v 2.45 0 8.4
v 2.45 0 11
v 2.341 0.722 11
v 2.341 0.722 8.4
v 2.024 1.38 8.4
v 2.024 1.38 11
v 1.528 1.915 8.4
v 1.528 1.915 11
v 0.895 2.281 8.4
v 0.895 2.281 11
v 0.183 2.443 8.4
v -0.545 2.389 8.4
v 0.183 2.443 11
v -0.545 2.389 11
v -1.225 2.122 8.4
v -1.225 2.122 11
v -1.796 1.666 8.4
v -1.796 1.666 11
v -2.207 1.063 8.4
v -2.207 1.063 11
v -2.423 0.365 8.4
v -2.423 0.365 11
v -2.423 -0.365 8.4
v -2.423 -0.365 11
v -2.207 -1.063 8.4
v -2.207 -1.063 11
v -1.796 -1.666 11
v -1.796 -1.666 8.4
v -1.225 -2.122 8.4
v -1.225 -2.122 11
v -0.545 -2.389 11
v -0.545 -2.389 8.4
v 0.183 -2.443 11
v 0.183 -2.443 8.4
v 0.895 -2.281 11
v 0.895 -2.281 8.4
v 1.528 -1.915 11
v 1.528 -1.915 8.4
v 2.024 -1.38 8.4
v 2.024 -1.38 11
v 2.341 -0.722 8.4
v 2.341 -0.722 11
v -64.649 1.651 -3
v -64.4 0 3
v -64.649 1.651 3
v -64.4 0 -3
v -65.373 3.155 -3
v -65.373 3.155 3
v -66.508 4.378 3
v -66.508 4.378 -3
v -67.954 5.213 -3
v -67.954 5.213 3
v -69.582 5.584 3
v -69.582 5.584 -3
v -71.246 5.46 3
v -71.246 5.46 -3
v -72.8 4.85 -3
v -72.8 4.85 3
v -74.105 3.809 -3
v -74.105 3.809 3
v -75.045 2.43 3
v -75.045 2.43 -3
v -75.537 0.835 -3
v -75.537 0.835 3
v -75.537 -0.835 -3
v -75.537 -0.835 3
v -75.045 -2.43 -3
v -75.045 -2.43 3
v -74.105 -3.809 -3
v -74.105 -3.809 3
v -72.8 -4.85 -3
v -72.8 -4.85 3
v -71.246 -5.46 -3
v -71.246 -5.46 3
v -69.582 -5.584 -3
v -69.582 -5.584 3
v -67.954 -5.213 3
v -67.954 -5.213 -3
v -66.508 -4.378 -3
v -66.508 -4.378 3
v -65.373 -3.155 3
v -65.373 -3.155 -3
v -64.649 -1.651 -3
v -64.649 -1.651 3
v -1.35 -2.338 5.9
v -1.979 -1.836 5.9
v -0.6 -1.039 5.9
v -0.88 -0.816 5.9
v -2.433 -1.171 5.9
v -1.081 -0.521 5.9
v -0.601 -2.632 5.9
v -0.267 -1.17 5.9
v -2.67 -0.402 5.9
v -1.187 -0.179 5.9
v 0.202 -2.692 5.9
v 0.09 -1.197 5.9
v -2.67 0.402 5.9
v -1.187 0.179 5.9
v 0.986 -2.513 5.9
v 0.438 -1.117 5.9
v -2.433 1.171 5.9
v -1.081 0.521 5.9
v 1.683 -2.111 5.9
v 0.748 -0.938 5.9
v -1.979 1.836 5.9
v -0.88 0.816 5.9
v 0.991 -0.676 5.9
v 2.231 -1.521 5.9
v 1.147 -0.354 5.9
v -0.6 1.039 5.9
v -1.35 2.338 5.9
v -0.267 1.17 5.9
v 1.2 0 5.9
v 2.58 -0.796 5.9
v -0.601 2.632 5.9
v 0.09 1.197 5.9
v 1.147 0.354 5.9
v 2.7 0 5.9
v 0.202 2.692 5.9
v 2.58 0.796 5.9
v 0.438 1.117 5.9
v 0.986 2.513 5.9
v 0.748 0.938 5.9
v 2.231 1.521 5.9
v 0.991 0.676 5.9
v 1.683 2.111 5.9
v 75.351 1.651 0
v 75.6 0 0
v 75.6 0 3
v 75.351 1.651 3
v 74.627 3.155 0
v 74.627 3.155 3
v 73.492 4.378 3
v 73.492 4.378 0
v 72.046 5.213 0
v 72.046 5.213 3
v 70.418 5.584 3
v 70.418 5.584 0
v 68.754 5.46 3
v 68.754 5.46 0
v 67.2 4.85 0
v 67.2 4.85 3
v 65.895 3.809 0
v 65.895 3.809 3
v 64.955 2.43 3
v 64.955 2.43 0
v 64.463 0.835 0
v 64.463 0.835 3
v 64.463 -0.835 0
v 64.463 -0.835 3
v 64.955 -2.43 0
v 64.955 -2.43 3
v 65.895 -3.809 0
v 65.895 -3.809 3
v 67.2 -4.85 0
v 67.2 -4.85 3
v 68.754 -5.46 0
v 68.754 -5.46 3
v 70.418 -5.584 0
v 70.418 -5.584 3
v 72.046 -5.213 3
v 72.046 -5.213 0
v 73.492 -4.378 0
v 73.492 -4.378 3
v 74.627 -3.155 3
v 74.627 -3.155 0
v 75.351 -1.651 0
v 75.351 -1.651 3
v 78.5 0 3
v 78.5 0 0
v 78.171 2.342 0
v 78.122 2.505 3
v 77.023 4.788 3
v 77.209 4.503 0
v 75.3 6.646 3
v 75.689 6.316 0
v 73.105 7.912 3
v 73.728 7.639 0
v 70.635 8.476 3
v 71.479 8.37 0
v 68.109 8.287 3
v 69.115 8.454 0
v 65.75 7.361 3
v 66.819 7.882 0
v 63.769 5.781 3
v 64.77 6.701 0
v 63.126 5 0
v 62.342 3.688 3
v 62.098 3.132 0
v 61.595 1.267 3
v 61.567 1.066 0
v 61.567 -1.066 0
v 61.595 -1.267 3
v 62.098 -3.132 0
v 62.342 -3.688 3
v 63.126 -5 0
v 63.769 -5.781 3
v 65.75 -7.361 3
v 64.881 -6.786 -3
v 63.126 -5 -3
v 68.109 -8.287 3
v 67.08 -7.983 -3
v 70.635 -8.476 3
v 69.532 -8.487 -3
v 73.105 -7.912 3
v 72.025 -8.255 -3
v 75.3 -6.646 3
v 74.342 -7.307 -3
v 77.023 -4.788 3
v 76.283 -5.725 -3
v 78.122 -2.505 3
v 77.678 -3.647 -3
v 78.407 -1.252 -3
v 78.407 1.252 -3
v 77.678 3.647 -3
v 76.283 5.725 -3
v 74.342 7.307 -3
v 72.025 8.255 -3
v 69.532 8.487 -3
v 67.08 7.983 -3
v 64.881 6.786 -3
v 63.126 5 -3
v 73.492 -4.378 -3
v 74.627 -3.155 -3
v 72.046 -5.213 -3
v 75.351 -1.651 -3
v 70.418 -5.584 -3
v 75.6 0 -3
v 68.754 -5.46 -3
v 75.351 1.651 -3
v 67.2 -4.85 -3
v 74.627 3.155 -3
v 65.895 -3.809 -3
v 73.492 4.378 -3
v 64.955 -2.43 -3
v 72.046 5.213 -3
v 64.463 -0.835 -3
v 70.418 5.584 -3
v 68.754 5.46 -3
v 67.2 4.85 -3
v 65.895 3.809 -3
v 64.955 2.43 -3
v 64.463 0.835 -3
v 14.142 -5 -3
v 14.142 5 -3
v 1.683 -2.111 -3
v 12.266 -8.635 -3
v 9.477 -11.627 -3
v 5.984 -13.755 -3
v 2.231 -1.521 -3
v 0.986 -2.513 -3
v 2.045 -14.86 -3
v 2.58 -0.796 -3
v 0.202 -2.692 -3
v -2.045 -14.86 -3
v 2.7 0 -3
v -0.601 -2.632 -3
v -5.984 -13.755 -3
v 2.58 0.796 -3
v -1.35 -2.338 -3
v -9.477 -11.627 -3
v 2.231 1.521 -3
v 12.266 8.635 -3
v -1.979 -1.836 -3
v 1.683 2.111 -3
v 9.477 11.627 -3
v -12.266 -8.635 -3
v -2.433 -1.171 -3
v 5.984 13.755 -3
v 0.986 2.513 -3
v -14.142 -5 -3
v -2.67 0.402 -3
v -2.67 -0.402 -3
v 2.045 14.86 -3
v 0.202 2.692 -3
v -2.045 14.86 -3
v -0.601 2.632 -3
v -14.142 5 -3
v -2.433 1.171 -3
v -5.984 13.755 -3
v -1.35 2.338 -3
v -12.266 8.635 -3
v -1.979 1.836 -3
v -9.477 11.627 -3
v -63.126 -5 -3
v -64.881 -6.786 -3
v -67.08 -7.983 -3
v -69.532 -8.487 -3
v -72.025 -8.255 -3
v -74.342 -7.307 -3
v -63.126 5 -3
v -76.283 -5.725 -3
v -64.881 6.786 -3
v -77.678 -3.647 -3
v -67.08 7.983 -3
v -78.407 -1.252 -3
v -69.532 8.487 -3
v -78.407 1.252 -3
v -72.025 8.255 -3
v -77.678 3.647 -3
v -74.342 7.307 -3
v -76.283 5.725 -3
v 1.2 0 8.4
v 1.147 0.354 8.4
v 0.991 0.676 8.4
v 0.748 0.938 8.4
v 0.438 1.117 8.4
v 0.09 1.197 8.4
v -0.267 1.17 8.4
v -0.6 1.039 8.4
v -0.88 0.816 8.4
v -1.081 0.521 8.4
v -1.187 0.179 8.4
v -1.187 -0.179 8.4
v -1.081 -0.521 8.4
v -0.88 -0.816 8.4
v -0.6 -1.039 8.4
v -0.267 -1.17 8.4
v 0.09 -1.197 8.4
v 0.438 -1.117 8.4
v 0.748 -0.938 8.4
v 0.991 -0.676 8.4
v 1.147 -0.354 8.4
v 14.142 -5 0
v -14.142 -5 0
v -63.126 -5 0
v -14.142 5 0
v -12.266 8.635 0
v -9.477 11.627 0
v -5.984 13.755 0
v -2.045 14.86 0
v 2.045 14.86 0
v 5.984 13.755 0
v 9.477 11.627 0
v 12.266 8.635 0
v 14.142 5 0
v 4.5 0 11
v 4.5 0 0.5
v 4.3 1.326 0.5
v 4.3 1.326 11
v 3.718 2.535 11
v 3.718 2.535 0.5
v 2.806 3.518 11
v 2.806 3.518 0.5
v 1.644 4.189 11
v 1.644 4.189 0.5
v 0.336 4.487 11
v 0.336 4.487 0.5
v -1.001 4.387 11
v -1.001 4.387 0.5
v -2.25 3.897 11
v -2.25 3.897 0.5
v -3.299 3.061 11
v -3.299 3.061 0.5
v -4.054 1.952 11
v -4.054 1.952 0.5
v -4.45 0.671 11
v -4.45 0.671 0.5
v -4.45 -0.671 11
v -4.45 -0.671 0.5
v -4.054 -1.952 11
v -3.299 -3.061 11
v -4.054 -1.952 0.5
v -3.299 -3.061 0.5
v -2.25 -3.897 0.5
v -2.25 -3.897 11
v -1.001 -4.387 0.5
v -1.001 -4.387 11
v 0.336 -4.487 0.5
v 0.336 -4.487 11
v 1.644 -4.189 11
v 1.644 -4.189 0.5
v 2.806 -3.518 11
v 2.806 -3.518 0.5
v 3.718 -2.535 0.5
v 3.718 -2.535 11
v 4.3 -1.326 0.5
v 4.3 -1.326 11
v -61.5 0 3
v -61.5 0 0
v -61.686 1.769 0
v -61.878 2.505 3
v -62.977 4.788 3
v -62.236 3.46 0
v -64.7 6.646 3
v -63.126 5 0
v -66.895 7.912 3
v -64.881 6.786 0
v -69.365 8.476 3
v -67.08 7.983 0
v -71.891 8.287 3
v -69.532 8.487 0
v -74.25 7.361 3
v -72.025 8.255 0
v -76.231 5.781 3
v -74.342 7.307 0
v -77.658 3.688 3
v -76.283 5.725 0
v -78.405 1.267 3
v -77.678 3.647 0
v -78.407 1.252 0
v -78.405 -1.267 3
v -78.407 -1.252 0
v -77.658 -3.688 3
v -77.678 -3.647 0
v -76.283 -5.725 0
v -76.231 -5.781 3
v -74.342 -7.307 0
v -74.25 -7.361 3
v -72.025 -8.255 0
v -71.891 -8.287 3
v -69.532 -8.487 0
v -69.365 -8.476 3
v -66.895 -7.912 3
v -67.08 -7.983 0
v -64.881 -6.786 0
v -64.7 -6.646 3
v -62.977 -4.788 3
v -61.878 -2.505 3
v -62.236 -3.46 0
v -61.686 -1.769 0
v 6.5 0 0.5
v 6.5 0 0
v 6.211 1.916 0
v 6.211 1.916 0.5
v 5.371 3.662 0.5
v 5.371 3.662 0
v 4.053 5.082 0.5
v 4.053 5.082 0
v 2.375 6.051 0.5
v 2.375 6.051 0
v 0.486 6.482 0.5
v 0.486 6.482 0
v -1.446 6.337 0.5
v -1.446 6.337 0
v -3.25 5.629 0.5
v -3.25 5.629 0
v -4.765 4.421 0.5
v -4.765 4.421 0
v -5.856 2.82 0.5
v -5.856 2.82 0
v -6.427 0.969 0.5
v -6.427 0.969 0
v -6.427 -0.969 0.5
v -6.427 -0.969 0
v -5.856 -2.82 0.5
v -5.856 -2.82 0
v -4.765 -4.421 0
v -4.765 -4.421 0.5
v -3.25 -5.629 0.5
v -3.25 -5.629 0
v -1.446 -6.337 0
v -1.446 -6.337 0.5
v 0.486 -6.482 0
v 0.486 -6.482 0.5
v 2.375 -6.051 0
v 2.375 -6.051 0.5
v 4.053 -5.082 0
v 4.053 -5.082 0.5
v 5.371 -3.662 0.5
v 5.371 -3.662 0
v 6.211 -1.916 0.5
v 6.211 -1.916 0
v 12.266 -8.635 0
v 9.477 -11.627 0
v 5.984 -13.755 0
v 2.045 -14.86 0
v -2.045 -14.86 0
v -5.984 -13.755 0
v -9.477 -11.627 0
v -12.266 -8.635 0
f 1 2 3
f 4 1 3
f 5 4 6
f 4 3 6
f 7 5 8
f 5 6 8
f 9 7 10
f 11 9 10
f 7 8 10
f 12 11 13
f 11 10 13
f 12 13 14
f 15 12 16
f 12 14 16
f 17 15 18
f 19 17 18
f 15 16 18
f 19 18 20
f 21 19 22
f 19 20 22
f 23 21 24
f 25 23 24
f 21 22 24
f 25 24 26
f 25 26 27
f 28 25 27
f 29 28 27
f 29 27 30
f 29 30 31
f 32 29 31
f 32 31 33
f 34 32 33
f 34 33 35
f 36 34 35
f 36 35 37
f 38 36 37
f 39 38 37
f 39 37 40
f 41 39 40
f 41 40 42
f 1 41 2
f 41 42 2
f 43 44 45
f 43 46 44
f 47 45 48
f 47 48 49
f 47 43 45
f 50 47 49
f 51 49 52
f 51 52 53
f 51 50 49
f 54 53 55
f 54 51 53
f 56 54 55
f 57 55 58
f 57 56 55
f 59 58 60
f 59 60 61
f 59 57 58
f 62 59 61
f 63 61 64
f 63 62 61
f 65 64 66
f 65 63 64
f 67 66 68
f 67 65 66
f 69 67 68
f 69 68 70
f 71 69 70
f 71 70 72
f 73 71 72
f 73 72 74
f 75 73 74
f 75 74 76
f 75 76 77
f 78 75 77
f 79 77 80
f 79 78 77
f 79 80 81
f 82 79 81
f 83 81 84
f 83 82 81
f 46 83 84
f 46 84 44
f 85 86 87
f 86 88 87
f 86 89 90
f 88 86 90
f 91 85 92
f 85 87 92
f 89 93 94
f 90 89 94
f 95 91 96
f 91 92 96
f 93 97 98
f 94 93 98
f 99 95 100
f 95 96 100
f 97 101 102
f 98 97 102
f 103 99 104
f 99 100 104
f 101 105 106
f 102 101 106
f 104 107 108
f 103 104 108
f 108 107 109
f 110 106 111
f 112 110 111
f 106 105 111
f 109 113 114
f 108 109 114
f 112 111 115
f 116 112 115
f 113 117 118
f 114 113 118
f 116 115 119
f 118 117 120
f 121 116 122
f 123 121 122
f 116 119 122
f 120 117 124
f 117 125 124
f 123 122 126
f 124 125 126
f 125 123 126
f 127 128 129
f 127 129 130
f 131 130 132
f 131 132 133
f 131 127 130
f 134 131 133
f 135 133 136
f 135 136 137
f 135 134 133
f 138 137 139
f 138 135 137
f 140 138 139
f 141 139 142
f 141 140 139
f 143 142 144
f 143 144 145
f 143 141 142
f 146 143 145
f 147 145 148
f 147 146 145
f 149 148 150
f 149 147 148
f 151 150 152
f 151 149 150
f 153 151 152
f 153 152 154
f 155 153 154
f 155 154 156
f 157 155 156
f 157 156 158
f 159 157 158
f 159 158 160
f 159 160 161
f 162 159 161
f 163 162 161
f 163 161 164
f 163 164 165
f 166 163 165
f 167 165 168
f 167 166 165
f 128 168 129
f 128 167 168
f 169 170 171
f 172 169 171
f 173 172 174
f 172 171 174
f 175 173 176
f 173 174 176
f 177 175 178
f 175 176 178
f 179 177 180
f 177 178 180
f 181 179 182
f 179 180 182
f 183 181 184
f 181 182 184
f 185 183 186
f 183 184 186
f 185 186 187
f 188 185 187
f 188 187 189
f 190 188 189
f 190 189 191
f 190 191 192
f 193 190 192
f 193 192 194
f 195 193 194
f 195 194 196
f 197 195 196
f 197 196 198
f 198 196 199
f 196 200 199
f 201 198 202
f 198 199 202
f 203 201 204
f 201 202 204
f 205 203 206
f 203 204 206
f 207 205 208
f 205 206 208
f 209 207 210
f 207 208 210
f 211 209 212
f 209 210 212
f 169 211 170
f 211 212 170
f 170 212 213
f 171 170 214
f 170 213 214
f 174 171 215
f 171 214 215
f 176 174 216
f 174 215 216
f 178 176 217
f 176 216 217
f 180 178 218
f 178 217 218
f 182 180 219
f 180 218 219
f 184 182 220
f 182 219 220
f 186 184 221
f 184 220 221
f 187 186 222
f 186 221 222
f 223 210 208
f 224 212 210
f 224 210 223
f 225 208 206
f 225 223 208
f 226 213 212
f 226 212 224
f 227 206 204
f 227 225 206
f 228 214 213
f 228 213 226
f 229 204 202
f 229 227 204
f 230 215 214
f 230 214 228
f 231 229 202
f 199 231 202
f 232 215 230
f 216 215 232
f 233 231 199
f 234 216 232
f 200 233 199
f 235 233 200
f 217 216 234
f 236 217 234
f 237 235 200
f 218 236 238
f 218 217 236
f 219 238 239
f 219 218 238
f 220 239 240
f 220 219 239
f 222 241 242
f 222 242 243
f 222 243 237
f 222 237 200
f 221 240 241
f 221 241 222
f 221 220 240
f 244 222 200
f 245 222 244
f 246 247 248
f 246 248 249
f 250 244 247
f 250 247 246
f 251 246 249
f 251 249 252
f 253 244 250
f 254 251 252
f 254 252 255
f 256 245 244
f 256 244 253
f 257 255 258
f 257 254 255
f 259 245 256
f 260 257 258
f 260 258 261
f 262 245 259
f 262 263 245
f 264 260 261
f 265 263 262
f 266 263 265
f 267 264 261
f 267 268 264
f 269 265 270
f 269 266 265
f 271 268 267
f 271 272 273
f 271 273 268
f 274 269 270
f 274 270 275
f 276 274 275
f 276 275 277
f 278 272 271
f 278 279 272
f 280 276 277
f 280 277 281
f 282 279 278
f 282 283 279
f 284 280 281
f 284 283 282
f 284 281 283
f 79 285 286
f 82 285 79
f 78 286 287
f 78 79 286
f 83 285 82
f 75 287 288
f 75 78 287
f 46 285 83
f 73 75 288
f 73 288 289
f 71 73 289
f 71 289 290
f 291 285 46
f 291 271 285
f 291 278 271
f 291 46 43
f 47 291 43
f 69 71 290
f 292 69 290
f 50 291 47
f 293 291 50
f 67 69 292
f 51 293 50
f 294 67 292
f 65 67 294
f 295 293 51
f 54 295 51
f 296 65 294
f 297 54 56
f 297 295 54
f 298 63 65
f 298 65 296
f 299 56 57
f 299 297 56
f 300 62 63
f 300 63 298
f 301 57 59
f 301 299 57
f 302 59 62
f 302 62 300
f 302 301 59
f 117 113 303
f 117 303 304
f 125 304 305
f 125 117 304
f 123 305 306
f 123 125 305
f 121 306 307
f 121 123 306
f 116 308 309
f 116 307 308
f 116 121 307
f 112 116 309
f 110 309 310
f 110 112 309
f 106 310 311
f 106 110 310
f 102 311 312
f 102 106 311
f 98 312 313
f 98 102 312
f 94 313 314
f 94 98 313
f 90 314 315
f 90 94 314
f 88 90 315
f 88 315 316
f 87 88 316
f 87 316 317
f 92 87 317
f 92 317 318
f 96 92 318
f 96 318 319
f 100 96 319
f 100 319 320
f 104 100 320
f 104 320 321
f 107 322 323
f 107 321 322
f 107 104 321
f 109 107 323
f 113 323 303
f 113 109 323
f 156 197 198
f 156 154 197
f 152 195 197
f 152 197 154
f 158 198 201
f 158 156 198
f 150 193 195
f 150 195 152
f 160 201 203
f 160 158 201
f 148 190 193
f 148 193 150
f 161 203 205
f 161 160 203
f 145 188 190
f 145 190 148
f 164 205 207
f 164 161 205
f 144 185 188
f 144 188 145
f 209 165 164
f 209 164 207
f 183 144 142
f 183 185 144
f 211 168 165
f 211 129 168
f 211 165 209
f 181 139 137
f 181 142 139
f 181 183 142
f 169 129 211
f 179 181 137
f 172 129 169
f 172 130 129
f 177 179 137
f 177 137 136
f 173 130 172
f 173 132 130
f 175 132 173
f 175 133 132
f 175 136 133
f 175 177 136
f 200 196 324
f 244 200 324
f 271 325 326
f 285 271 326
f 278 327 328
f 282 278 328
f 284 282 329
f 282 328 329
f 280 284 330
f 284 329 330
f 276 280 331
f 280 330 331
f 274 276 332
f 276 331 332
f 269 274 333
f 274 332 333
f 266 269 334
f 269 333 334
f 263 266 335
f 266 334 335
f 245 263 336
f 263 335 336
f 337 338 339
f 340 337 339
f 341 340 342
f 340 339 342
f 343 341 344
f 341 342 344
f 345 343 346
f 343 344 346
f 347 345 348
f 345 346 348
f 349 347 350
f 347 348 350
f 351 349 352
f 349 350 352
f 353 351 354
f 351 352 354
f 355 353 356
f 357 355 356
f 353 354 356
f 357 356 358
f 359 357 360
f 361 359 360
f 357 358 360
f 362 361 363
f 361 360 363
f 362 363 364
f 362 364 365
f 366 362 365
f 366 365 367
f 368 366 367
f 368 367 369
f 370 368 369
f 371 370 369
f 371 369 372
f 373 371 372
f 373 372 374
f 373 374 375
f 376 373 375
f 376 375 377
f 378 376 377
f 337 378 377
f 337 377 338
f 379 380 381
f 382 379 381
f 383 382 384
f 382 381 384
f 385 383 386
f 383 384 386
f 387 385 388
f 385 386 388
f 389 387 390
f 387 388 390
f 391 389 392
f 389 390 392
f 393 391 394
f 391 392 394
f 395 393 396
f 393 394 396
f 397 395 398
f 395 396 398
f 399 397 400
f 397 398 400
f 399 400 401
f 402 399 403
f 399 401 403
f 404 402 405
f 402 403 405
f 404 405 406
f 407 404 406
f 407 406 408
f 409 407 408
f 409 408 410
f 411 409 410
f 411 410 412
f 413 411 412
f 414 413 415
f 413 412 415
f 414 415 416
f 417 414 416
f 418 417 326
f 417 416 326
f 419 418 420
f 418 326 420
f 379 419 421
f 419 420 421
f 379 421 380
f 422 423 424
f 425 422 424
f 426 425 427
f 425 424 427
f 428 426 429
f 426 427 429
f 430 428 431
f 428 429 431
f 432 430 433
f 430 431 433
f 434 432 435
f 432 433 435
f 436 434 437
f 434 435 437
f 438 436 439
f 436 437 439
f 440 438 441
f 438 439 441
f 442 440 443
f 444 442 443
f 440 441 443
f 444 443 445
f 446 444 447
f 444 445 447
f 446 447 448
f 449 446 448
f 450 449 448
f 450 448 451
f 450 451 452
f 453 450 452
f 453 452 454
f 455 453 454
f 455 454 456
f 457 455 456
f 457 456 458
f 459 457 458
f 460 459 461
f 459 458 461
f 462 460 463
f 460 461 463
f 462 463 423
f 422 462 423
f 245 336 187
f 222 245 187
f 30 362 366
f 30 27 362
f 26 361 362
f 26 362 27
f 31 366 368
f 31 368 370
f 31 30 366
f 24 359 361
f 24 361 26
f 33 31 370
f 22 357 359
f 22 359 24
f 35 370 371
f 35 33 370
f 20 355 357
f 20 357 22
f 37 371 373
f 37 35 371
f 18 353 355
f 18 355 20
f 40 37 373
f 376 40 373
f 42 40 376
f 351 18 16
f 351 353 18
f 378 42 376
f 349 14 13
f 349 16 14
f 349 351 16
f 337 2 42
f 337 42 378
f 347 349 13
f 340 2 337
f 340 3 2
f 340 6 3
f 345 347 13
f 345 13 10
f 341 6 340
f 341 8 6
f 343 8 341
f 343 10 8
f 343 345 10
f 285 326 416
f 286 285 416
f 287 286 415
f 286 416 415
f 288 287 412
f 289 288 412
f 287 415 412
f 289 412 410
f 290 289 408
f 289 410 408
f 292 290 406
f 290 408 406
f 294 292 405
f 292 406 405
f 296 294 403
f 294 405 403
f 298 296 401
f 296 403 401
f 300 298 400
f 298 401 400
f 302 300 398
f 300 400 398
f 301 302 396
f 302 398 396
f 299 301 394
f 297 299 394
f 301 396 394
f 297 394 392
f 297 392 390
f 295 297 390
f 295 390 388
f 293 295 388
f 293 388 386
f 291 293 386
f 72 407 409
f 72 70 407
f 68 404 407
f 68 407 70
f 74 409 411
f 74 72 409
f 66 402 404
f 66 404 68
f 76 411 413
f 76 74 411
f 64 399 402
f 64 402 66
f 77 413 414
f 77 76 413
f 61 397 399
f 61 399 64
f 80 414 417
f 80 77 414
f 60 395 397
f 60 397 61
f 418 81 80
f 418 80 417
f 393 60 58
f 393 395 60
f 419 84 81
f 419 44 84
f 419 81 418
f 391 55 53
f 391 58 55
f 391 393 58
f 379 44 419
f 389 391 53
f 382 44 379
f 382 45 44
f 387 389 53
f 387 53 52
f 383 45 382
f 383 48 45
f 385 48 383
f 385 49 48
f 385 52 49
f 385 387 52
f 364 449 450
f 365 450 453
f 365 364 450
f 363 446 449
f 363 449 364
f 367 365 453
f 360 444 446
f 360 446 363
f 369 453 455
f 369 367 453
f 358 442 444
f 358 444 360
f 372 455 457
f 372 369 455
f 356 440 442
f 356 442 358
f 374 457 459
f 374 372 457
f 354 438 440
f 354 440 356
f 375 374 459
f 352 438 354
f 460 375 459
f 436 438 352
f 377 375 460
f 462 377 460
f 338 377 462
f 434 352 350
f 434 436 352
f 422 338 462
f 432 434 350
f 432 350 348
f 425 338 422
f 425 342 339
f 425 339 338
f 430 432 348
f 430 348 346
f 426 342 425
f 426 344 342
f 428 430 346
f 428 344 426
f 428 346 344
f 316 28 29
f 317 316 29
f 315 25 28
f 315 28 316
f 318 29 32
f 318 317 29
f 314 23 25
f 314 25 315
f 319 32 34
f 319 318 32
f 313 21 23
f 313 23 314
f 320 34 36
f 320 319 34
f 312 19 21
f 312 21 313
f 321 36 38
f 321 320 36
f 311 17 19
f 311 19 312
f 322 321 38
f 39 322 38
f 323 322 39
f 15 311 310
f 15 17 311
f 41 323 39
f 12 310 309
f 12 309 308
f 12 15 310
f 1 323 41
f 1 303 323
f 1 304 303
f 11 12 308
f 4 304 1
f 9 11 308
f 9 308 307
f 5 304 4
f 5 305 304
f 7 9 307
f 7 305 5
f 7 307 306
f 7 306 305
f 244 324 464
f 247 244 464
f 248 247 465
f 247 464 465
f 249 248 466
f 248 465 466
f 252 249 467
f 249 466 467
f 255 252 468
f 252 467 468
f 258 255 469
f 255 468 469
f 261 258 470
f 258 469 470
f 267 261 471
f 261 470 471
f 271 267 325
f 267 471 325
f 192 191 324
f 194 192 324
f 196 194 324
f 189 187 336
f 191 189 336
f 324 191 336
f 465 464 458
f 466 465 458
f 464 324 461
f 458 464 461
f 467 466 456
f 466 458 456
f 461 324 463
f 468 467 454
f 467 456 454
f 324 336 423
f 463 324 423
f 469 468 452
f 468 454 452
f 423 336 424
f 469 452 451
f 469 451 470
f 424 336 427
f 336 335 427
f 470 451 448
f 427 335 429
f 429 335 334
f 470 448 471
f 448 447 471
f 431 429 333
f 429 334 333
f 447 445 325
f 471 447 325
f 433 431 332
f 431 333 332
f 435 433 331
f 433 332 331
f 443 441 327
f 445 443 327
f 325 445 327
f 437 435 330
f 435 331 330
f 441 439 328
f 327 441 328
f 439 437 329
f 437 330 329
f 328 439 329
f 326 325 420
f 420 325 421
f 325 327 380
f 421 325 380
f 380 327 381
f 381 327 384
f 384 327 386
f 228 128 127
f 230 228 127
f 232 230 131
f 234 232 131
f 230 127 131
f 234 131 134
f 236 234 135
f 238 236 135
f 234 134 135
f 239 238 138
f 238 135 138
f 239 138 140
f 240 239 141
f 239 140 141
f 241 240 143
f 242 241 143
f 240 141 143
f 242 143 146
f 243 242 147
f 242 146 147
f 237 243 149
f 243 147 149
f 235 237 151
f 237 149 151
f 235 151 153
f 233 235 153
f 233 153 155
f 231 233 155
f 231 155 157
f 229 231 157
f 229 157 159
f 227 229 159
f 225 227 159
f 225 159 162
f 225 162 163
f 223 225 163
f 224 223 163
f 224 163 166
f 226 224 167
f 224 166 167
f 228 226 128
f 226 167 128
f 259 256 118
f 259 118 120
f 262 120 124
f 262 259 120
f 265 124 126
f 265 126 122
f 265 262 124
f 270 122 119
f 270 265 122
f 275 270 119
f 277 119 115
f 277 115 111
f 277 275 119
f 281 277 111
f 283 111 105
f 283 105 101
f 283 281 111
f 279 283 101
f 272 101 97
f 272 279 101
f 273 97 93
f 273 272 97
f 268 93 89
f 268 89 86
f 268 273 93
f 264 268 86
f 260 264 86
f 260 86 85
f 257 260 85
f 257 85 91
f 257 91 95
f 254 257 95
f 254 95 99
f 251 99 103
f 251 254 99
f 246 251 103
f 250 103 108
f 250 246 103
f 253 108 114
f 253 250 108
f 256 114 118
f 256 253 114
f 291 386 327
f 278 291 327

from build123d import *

# Parameters (mm, degrees)
SKETCH1_R               = 4.5
BOSS_EXTRUDE1_DEPTH     = 11
SKETCH2_R               = 5.6
BOSS_EXTRUDE2_DEPTH     = 3
SKETCH3_R               = 6.5
BOSS_EXTRUDE3_DEPTH     = 0.5
SKETCH4_R               = 8.5
SKETCH4_R_2             = 5.6
BOSS_EXTRUDE4_DEPTH     = 3
CUT_EXTRUDE1_START      = 11
SKETCH5_R               = 2.45
CUT_EXTRUDE1_DEPTH      = 2.6
SKETCH7_R               = 1.2
CUT_EXTRUDE3_DEPTH      = 12
CUT_EXTRUDE3_DEPTH_BACK = 4
CUT_EXTRUDE4_START      = -3
SKETCH8_R               = 2.7
CUT_EXTRUDE4_DEPTH      = 8.9


with BuildPart() as part:
    # Sketch1 → Boss-Extrude1 (new body)
    with BuildSketch(Plane.XY):
        Circle(SKETCH1_R)
    extrude(amount=BOSS_EXTRUDE1_DEPTH)

    # Sketch2 → Boss-Extrude2 (add)
    with BuildSketch(Plane.XY):
        with BuildLine():
            Line((14.142135624, 5), (63.126136458, 5))
            ThreePointArc((63.126136458, 5), (78.5, 0), (63.126136458, -5))
            Line((63.126136458, -5), (14.142135624, -5))
            ThreePointArc((14.142135624, -5), (0, -15), (-14.142135624, -5))
            Line((-14.142135624, -5), (-63.126136458, -5))
            ThreePointArc((-63.126136458, -5), (-78.5, 0), (-63.126136458, 5))
            Line((-63.126136458, 5), (-14.142135624, 5))
            ThreePointArc((-14.142135624, 5), (0, 15), (14.142135624, 5))
        make_face()
        with Locations((70, 0)):
            Circle(SKETCH2_R, mode=Mode.SUBTRACT)
        with Locations((-70, 0)):
            Circle(SKETCH2_R, mode=Mode.SUBTRACT)
    extrude(amount=-BOSS_EXTRUDE2_DEPTH)

    # Sketch3 → Boss-Extrude3 (add)
    with BuildSketch(Plane.XY):
        Circle(SKETCH3_R)
    extrude(amount=BOSS_EXTRUDE3_DEPTH)

    # Sketch4 → Boss-Extrude4 (add)
    with BuildSketch(Plane.XY):
        with Locations((-70, 0)):
            Circle(SKETCH4_R)
        with Locations((-70, 0)):
            Circle(SKETCH4_R_2, mode=Mode.SUBTRACT)
        with Locations((70, 0)):
            Circle(SKETCH4_R)
        with Locations((70, 0)):
            Circle(SKETCH4_R_2, mode=Mode.SUBTRACT)
    extrude(amount=BOSS_EXTRUDE4_DEPTH)

    # Sketch5 → Cut-Extrude1 (cut)
    with BuildSketch(Plane.XY.offset(CUT_EXTRUDE1_START)):
        Circle(SKETCH5_R)
    extrude(amount=-CUT_EXTRUDE1_DEPTH, mode=Mode.SUBTRACT)

    # Sketch7 → Cut-Extrude3 (cut, two sides)
    with BuildSketch(Plane.XY) as cut_extrude3_sk:
        Circle(SKETCH7_R)
    extrude(amount=CUT_EXTRUDE3_DEPTH, mode=Mode.SUBTRACT)
    extrude(cut_extrude3_sk.sketch, amount=-CUT_EXTRUDE3_DEPTH_BACK, mode=Mode.SUBTRACT)

    # Sketch8 → Cut-Extrude4 (cut)
    with BuildSketch(Plane.XY.offset(CUT_EXTRUDE4_START)):
        Circle(SKETCH8_R)
    extrude(amount=CUT_EXTRUDE4_DEPTH, mode=Mode.SUBTRACT)


solid = part.part
